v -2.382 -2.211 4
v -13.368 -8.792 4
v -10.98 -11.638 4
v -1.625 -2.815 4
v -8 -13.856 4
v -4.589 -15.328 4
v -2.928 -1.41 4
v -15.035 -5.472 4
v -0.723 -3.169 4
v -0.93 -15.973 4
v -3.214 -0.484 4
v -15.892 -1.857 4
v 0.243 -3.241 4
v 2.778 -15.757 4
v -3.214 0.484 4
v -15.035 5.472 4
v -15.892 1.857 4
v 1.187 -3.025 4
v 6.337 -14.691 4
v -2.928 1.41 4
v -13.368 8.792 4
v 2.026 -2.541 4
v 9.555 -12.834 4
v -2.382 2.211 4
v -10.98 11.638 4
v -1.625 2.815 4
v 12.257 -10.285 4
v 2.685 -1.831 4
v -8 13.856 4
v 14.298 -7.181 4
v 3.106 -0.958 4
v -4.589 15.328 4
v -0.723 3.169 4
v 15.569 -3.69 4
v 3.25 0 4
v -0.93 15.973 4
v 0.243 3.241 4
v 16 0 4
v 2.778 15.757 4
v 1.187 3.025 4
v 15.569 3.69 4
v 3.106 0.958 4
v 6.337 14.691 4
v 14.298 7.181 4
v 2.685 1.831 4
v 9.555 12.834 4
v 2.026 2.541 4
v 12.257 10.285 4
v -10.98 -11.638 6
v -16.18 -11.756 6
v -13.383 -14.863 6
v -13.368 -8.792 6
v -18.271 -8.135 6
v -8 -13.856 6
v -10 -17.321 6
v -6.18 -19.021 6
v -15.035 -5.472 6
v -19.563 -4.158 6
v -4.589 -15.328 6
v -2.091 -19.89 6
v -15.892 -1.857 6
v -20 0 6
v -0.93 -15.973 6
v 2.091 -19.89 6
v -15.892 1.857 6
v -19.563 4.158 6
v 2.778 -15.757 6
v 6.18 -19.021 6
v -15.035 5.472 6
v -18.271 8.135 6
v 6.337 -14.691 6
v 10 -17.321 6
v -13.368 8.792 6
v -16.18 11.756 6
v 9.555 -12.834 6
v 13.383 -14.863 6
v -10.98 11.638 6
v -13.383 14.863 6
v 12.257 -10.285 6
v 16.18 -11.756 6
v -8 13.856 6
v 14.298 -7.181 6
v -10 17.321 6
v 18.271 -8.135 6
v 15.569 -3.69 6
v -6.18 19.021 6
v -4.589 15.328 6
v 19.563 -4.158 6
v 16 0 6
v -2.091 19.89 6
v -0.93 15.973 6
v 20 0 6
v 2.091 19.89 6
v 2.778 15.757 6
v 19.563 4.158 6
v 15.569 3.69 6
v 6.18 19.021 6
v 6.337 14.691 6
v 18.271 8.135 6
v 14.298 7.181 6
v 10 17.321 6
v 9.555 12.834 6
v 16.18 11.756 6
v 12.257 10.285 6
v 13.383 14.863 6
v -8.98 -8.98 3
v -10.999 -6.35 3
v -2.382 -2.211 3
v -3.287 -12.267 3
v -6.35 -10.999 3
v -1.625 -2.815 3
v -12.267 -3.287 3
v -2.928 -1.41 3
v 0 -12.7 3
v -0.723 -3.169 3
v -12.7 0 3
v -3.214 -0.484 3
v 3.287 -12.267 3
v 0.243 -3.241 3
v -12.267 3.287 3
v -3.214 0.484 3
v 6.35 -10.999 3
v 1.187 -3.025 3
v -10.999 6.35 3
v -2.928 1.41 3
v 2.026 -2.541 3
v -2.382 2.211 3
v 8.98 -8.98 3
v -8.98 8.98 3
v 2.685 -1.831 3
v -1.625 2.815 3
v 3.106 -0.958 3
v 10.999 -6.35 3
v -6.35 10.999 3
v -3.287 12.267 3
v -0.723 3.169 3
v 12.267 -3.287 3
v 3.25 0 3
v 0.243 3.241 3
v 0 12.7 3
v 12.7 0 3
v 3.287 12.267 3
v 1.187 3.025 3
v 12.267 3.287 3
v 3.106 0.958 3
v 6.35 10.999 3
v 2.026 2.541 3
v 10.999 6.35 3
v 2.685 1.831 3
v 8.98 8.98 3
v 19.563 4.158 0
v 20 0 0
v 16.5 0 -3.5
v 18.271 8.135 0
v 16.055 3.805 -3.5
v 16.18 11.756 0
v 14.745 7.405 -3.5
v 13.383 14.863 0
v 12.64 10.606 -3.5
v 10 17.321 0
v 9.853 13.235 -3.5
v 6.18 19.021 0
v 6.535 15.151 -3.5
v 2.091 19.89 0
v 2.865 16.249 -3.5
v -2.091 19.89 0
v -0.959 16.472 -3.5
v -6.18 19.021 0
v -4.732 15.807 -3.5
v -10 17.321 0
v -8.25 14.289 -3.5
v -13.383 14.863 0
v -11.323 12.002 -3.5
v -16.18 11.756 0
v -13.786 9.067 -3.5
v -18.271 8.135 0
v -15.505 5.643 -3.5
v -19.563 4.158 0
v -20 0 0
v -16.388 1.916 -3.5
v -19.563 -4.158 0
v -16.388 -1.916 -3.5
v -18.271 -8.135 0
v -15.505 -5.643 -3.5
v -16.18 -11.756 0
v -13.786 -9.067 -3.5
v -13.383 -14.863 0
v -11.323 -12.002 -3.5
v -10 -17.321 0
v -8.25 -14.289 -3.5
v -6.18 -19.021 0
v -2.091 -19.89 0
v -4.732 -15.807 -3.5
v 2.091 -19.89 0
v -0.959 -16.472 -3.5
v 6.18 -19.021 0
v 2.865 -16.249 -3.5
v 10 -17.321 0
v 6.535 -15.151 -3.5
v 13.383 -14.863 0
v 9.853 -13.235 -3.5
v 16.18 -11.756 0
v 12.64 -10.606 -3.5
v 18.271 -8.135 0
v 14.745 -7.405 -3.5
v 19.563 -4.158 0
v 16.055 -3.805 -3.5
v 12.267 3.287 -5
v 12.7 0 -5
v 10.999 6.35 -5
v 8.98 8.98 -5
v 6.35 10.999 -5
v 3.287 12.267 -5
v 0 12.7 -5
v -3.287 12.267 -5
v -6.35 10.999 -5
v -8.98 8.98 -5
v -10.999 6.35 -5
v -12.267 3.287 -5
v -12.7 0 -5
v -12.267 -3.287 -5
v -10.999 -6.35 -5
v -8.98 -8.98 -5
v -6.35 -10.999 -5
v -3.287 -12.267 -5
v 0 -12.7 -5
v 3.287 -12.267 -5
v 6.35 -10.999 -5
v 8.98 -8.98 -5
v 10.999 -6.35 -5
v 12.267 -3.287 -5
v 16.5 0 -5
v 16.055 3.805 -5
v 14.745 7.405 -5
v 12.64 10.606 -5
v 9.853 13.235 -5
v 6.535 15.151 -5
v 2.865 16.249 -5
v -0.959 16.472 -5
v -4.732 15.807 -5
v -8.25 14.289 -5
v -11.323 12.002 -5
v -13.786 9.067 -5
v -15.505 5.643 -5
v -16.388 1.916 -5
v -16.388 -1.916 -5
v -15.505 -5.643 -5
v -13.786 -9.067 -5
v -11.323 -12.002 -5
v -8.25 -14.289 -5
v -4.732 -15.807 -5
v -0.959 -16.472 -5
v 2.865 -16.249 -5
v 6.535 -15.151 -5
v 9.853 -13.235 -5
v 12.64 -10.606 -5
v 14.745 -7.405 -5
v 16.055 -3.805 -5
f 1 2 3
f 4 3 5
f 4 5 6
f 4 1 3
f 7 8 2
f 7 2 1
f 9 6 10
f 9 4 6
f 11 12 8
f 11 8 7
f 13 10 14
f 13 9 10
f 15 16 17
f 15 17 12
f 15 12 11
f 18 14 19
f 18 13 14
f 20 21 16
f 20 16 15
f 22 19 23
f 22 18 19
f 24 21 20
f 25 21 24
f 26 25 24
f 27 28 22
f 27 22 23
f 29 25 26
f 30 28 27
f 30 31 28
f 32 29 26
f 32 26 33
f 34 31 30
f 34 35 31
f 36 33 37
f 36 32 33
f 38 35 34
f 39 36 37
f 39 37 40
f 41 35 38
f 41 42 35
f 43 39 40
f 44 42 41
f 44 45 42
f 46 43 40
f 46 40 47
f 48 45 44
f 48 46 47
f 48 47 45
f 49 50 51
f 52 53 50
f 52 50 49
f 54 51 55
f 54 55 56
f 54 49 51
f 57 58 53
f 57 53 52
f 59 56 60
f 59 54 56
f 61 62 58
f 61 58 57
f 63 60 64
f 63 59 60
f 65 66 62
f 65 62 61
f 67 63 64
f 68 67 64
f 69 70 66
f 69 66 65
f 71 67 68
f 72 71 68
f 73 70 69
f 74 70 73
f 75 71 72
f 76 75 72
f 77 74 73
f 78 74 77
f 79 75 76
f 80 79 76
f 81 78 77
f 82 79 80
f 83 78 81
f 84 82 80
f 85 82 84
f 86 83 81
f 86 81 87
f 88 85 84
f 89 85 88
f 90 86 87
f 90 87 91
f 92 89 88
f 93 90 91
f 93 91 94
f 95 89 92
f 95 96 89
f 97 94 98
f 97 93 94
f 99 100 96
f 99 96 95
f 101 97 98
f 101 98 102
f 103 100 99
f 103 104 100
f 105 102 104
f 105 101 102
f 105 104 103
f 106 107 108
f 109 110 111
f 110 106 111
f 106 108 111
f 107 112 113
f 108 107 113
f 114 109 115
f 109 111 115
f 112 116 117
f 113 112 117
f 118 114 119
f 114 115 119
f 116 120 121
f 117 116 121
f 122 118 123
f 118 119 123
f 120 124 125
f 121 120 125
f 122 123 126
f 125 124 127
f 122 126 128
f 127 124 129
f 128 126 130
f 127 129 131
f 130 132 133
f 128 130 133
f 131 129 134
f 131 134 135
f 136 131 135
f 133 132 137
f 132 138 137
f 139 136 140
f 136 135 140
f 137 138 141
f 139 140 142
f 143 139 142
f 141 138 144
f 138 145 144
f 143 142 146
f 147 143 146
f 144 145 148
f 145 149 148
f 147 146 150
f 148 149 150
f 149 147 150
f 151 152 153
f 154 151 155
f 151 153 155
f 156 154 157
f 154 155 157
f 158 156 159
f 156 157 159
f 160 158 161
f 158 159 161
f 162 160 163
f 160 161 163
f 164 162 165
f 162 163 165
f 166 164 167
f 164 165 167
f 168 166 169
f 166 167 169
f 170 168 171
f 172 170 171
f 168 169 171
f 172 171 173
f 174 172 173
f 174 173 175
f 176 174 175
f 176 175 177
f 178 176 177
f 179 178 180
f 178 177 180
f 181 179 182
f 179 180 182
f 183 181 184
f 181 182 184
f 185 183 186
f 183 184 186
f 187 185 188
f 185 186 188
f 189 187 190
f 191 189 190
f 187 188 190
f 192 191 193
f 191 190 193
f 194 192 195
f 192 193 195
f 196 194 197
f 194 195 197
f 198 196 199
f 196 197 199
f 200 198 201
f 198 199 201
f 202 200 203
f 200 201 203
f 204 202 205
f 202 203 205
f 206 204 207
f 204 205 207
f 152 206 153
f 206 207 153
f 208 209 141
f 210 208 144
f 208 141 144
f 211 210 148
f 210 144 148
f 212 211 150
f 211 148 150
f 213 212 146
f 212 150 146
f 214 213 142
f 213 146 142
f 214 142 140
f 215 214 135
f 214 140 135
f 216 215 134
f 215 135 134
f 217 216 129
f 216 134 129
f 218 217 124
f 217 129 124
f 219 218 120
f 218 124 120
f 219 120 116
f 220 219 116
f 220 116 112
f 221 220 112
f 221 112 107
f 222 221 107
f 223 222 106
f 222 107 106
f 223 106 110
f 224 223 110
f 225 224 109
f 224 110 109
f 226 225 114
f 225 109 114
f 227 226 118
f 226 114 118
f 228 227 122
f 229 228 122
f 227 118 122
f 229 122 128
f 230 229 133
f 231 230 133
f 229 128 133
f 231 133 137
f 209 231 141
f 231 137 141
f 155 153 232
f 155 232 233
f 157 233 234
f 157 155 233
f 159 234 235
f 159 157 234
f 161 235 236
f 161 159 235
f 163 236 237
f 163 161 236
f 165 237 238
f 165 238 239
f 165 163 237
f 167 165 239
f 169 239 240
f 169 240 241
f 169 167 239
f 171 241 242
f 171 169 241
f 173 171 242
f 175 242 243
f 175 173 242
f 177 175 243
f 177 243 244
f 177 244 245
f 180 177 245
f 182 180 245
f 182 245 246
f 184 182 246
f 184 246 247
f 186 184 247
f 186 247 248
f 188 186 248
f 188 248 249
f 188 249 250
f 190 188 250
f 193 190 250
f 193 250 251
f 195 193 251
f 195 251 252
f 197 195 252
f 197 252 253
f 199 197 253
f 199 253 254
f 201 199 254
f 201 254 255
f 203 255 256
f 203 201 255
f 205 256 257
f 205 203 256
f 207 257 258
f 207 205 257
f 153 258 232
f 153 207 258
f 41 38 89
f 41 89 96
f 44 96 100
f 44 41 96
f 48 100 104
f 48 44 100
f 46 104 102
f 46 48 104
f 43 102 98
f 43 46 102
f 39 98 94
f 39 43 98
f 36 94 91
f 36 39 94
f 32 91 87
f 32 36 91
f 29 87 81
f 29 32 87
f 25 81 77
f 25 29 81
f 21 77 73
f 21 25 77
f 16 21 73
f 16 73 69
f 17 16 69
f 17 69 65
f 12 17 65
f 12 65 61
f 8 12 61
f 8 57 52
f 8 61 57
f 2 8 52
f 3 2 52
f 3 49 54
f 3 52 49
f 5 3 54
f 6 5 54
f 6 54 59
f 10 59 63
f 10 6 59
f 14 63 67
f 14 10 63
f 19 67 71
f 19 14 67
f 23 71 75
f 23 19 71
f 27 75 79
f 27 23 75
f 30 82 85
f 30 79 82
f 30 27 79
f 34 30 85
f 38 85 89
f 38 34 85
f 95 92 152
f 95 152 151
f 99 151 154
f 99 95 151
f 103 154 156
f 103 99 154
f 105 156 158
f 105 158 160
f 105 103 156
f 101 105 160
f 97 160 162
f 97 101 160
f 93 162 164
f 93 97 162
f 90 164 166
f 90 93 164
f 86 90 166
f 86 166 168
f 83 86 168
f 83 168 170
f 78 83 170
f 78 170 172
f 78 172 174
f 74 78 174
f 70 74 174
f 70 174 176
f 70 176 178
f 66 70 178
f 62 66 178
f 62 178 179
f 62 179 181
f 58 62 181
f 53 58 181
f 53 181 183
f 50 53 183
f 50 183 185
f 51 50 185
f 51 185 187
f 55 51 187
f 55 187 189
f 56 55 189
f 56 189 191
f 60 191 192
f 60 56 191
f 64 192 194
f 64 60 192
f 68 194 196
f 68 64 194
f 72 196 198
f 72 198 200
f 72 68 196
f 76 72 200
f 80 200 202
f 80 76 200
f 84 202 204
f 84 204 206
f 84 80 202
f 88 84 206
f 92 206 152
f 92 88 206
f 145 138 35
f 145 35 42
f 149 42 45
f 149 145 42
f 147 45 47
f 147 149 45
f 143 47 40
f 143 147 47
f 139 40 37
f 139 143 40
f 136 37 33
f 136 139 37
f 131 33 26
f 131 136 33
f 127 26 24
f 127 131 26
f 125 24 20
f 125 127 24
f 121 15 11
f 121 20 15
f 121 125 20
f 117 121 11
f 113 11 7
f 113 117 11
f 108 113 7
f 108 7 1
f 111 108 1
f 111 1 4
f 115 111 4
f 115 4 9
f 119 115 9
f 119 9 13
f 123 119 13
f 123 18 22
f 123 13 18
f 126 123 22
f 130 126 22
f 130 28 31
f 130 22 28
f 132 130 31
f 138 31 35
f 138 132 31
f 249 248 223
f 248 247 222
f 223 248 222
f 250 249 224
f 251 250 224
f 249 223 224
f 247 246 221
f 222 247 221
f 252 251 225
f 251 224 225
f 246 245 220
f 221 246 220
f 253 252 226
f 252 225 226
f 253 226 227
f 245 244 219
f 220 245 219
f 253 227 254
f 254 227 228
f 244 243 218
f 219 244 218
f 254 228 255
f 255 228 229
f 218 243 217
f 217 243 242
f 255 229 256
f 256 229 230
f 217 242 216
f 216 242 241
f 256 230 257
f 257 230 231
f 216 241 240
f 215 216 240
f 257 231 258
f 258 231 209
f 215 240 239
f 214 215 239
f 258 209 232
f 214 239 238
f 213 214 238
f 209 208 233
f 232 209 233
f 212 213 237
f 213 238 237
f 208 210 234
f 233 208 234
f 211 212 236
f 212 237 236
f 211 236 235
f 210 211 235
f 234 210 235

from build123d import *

# Parameters (mm, degrees)
F0_R          = 12.75
F0_R_2        = 3.25
F1_DEPTH      = 5
F0_R_3        = 20
F2_DEPTH      = 6
F2_DEPTH_BACK = 5
F3_SIZE       = 5
F4_R          = 16
F5_DEPTH      = 3
F6_START      = 4
F6_DEPTH      = 21
F7_R          = 16.5
F7_R_2        = 12.7
F8_DEPTH      = 4
F8_DEPTH_BACK = 5


with BuildPart() as f1:
    # F0 (on Top) → F1 (new body)
    with BuildSketch(Plane.XY):
        Circle(F0_R)
        Circle(F0_R_2, mode=Mode.SUBTRACT)
    extrude(amount=F1_DEPTH)

    # F0 (on Top) → F2 (join, two sides)
    with BuildSketch(Plane.XY) as f2_sk:
        Circle(F0_R_3)
        Circle(F0_R, mode=Mode.SUBTRACT)
    extrude(amount=F2_DEPTH)
    extrude(f2_sk.sketch, amount=-F2_DEPTH_BACK)

    # F3
    f3_edges = [f1.edges().sort_by_distance(p)[0] for p in [
        (-20, 0, -5),
    ]]
    chamfer(f3_edges, length=F3_SIZE)

    # F4 (on Top) → F5 (cut)
    with BuildSketch(Plane.XY):
        Circle(F4_R)
    extrude(amount=F5_DEPTH, mode=Mode.SUBTRACT)

    # F4 (on Top) → F6 (cut)
    with BuildSketch(Plane.XY.offset(F6_START)):
        Circle(F4_R)
    extrude(amount=F6_DEPTH, mode=Mode.SUBTRACT)

    # F7 (on Top) → F8 (join, two sides)
    with BuildSketch(Plane.XY) as f8_sk:
        Circle(F7_R)
        Circle(F7_R_2, mode=Mode.SUBTRACT)
    extrude(amount=F8_DEPTH)
    extrude(f8_sk.sketch, amount=-F8_DEPTH_BACK)


solid = f1.part
